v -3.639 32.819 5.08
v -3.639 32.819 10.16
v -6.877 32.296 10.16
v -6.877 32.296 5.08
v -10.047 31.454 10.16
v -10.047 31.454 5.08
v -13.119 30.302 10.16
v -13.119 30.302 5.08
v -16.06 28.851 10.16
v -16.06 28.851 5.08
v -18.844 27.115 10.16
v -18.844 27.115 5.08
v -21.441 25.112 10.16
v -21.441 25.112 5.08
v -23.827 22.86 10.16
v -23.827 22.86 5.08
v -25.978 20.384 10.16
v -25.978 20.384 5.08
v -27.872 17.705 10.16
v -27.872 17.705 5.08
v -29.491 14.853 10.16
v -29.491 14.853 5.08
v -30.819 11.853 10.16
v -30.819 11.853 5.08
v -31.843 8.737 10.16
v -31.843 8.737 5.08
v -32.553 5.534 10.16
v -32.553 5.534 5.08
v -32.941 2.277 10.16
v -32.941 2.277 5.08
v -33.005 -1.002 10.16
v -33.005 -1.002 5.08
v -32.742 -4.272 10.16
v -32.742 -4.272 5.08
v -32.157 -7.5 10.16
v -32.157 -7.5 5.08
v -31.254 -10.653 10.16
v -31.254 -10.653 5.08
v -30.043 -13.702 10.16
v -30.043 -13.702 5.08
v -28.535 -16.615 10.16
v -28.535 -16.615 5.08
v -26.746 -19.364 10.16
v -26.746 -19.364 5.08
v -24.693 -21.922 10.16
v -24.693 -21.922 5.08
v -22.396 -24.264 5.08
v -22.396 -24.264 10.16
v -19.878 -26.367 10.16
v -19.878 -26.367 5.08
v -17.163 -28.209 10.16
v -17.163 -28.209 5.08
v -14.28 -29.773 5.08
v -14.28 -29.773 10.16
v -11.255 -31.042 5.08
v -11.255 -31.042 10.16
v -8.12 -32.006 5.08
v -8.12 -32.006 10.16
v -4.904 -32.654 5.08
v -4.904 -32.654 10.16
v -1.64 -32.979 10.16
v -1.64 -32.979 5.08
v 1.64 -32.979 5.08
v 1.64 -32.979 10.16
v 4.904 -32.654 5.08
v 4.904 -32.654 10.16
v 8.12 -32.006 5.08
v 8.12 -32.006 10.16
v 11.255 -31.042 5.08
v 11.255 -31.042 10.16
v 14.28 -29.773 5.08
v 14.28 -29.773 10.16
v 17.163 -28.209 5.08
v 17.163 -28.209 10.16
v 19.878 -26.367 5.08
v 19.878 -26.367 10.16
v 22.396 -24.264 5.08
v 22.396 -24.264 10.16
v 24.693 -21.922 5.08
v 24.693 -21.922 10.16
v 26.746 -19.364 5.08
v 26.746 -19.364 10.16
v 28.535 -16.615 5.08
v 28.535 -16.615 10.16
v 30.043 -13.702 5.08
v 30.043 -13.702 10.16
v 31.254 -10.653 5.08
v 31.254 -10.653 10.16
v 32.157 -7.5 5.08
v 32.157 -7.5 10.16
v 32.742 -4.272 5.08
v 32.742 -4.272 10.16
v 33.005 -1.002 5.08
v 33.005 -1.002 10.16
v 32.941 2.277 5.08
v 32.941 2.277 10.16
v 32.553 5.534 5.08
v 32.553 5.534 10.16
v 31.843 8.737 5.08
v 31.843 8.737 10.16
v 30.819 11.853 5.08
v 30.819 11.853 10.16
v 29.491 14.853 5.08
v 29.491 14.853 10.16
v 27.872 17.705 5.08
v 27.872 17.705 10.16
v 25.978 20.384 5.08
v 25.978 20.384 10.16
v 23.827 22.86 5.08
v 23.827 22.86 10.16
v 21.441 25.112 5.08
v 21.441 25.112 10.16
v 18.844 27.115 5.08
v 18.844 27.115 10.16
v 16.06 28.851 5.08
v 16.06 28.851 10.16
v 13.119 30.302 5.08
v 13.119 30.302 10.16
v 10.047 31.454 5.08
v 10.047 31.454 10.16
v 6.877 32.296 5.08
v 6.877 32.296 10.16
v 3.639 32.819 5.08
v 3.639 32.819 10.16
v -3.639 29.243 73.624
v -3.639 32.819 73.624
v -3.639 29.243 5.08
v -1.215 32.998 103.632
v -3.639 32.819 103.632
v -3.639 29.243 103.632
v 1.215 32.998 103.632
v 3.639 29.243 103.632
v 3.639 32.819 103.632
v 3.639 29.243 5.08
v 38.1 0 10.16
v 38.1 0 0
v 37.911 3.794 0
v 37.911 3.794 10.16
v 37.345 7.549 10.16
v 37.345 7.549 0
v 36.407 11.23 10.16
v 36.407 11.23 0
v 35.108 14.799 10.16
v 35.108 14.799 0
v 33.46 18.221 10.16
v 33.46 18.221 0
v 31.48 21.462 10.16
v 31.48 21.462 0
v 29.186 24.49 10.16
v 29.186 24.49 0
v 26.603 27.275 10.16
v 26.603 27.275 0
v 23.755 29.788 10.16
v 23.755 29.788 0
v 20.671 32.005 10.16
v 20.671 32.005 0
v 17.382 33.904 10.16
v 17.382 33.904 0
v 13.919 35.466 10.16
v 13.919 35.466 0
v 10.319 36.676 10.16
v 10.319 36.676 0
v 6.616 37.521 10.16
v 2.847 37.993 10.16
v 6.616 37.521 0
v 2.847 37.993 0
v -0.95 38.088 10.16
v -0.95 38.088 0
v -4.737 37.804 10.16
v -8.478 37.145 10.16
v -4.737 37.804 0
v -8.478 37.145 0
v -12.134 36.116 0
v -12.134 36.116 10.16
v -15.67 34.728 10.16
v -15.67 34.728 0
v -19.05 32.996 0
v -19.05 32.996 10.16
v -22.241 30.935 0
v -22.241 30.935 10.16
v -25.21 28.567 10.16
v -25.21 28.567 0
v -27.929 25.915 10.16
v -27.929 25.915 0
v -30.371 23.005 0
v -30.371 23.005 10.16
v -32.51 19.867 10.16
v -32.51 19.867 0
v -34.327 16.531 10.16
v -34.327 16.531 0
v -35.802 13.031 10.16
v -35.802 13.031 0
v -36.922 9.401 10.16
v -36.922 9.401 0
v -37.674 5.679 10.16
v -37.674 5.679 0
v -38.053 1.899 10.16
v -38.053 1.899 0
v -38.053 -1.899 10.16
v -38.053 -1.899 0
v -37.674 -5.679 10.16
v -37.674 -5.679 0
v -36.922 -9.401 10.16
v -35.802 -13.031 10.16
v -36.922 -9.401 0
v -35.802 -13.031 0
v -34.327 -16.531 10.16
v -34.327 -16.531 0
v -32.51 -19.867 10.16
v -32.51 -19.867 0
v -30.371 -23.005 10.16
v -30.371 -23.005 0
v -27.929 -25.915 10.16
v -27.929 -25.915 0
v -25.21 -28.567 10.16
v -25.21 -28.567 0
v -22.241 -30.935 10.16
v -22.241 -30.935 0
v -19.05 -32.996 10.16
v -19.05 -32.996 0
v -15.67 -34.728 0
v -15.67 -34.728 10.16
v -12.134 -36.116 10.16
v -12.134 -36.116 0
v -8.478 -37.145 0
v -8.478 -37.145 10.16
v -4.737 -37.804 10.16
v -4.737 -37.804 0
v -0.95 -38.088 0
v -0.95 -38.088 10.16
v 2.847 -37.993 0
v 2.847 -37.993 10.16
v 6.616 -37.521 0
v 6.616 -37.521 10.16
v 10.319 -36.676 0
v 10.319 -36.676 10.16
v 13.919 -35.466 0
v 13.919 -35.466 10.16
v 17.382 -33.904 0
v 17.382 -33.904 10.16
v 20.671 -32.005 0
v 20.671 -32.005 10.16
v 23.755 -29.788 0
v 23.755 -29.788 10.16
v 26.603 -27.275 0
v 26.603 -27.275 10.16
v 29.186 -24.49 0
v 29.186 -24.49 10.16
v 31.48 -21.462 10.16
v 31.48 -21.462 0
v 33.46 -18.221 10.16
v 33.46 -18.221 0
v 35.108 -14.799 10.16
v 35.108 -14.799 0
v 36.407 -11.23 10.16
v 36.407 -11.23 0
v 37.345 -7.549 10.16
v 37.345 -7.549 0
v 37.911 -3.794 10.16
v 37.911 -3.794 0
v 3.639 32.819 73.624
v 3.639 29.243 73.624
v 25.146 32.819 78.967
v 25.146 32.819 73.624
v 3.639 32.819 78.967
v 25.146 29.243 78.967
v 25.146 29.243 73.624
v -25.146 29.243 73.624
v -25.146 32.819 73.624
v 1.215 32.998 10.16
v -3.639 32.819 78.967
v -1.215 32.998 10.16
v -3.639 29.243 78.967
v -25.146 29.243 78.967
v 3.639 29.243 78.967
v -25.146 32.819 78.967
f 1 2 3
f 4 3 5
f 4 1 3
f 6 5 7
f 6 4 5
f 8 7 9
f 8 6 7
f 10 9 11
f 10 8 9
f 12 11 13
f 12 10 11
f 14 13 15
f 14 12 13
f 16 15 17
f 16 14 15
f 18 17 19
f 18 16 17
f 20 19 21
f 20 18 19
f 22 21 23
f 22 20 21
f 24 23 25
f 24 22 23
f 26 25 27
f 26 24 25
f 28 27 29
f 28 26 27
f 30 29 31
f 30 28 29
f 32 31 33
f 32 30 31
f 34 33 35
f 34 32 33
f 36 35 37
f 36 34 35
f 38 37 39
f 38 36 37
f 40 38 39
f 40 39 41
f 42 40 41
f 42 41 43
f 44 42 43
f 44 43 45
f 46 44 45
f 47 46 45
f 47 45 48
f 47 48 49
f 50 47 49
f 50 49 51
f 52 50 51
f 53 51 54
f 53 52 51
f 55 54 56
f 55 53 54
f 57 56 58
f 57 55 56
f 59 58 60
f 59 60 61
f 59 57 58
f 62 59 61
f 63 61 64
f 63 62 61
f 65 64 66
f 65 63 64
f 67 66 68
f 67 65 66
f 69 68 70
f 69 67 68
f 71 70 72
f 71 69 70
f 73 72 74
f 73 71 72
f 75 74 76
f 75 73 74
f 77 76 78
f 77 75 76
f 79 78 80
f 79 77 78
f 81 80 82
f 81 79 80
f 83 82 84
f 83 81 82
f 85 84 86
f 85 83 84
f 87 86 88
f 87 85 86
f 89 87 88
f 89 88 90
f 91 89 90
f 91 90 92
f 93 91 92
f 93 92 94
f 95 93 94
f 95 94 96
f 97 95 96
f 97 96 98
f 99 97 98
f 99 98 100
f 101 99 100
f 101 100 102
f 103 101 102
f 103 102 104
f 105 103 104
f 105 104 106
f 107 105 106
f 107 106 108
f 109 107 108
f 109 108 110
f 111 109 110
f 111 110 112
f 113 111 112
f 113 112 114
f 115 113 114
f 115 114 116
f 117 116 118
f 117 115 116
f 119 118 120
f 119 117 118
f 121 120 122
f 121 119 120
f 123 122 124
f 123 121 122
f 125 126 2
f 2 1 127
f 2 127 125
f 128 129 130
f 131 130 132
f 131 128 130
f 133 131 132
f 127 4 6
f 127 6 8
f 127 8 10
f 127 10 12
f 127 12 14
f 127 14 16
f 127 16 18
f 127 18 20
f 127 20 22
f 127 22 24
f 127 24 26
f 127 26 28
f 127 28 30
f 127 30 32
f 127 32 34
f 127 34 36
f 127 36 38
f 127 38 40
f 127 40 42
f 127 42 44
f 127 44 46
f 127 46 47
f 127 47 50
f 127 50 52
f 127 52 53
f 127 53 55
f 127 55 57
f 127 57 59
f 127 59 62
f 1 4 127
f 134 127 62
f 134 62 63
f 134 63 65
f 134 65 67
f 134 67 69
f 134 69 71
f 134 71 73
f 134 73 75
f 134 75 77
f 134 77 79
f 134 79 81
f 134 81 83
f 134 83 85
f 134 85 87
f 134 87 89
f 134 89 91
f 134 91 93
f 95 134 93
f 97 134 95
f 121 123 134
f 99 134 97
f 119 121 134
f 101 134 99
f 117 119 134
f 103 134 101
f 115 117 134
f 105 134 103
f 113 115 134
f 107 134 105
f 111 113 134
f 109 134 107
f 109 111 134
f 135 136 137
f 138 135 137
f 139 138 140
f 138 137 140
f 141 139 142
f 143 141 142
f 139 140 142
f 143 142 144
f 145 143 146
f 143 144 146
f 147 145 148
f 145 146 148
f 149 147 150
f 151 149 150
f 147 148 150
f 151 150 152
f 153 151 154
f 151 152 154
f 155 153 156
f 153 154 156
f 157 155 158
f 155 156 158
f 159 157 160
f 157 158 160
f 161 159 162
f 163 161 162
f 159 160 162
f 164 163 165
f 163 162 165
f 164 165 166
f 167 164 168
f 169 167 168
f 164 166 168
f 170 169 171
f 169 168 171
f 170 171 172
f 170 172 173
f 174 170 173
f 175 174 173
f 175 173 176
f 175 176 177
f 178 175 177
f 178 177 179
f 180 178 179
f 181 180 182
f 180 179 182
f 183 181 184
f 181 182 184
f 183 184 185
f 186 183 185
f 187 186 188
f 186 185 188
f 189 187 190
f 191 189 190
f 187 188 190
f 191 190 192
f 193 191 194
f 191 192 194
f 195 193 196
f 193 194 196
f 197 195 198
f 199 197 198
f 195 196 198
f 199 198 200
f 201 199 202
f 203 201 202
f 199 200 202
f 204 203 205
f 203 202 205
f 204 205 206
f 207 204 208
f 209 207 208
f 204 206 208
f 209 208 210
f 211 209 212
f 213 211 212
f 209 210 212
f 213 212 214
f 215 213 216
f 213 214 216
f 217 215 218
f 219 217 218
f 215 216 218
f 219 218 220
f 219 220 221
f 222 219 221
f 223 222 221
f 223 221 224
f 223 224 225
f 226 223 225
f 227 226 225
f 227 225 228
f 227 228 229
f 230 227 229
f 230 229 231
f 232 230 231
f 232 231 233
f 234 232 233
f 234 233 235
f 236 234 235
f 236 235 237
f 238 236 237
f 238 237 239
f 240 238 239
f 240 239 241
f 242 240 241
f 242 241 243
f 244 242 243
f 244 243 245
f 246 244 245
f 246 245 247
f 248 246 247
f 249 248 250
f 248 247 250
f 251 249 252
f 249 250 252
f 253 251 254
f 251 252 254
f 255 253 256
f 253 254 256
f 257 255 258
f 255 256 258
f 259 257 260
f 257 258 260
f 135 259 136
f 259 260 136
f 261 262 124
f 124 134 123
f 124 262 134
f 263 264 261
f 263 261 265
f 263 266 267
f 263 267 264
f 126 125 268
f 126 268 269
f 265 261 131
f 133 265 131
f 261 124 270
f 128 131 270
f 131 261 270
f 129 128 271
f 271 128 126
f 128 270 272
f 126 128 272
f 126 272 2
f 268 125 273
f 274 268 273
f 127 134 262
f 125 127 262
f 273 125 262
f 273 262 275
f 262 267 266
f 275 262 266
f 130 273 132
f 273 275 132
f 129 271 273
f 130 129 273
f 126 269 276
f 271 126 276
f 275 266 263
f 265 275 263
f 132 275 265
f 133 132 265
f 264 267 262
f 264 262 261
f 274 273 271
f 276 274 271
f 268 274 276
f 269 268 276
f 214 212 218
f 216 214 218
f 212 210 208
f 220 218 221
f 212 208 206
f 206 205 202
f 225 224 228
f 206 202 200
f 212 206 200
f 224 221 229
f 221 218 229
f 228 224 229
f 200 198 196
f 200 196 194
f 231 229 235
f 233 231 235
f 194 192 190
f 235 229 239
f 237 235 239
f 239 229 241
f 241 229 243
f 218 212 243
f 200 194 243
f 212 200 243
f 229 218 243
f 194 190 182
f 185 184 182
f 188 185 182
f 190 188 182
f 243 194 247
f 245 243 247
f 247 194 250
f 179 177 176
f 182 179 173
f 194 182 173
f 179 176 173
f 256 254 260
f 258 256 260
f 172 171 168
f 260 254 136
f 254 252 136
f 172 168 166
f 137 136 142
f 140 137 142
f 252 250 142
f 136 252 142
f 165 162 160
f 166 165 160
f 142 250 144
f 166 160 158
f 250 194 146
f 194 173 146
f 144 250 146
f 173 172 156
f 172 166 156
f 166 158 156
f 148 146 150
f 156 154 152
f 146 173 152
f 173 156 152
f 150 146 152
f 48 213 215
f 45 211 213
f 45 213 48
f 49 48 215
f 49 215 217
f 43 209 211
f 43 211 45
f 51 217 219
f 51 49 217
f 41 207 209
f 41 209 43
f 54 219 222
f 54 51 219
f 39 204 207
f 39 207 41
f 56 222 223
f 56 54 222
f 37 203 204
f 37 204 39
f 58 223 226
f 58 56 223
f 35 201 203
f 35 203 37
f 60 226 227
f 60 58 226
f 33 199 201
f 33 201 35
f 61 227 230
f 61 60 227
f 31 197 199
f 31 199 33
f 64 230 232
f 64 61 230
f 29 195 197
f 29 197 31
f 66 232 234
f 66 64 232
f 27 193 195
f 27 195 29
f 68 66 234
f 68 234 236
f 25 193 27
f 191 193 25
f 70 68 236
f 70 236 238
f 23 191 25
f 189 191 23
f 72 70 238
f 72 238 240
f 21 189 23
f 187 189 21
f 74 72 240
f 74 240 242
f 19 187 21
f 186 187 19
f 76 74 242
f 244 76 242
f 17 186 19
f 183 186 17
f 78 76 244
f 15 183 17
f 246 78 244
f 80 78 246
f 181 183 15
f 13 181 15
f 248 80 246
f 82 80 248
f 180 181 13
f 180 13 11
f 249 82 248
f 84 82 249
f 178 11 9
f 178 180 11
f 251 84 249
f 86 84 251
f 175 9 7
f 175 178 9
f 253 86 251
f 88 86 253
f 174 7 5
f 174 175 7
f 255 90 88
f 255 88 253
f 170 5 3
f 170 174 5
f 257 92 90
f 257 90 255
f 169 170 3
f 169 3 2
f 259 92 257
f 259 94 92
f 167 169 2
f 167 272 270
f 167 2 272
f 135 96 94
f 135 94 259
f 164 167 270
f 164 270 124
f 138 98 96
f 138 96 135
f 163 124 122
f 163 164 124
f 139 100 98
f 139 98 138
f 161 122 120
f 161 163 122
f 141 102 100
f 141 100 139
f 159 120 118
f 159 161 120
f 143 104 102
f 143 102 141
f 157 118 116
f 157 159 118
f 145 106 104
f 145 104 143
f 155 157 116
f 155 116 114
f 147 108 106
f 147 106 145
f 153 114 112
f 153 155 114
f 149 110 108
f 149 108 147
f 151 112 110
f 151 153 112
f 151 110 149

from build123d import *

# Parameters (mm, degrees)
F0_R     = 38.1
F1_DEPTH = 10.16
F2_T     = -5.08
F4_DEPTH = 98.552
F5_W     = 3.5759293783
F5_H     = 5.342617631
F6_DEPTH = 25.146


with BuildPart() as f1:
    # F0 (on Top) → F1 (new body)
    with BuildSketch(Plane.XY):
        Circle(F0_R)
    extrude(amount=F1_DEPTH)

    # F2
    f2_openings = [f1.faces().sort_by_distance(p)[0] for p in [
        (0, 0, 10.16),
    ]]
    offset(amount=F2_T, openings=f2_openings)

    # F3 (on face) → F4 (join)
    with BuildSketch(Plane.XY.offset(5.08)):
        with BuildLine():
            Line((-3.6385965068, 29.2429830879), (3.6385965068, 29.2429830879))
            Line((3.6385965068, 29.2429830879), (3.6385965068, 32.8189124661))
            ThreePointArc((3.6385965068, 32.8189124661), (0, 33.02), (-3.6385965068, 32.8189124661))
            Line((-3.6385965068, 32.8189124661), (-3.6385965068, 29.2429830879))
        make_face()
    extrude(amount=F4_DEPTH)

    # F5 (on Right) → F6 (join, symmetric)
    with BuildSketch(Plane.YZ):
        with Locations((31.030947777, 76.2954577804)):
            Rectangle(F5_W, F5_H)
    extrude(amount=F6_DEPTH, both=True)


solid = f1.part
